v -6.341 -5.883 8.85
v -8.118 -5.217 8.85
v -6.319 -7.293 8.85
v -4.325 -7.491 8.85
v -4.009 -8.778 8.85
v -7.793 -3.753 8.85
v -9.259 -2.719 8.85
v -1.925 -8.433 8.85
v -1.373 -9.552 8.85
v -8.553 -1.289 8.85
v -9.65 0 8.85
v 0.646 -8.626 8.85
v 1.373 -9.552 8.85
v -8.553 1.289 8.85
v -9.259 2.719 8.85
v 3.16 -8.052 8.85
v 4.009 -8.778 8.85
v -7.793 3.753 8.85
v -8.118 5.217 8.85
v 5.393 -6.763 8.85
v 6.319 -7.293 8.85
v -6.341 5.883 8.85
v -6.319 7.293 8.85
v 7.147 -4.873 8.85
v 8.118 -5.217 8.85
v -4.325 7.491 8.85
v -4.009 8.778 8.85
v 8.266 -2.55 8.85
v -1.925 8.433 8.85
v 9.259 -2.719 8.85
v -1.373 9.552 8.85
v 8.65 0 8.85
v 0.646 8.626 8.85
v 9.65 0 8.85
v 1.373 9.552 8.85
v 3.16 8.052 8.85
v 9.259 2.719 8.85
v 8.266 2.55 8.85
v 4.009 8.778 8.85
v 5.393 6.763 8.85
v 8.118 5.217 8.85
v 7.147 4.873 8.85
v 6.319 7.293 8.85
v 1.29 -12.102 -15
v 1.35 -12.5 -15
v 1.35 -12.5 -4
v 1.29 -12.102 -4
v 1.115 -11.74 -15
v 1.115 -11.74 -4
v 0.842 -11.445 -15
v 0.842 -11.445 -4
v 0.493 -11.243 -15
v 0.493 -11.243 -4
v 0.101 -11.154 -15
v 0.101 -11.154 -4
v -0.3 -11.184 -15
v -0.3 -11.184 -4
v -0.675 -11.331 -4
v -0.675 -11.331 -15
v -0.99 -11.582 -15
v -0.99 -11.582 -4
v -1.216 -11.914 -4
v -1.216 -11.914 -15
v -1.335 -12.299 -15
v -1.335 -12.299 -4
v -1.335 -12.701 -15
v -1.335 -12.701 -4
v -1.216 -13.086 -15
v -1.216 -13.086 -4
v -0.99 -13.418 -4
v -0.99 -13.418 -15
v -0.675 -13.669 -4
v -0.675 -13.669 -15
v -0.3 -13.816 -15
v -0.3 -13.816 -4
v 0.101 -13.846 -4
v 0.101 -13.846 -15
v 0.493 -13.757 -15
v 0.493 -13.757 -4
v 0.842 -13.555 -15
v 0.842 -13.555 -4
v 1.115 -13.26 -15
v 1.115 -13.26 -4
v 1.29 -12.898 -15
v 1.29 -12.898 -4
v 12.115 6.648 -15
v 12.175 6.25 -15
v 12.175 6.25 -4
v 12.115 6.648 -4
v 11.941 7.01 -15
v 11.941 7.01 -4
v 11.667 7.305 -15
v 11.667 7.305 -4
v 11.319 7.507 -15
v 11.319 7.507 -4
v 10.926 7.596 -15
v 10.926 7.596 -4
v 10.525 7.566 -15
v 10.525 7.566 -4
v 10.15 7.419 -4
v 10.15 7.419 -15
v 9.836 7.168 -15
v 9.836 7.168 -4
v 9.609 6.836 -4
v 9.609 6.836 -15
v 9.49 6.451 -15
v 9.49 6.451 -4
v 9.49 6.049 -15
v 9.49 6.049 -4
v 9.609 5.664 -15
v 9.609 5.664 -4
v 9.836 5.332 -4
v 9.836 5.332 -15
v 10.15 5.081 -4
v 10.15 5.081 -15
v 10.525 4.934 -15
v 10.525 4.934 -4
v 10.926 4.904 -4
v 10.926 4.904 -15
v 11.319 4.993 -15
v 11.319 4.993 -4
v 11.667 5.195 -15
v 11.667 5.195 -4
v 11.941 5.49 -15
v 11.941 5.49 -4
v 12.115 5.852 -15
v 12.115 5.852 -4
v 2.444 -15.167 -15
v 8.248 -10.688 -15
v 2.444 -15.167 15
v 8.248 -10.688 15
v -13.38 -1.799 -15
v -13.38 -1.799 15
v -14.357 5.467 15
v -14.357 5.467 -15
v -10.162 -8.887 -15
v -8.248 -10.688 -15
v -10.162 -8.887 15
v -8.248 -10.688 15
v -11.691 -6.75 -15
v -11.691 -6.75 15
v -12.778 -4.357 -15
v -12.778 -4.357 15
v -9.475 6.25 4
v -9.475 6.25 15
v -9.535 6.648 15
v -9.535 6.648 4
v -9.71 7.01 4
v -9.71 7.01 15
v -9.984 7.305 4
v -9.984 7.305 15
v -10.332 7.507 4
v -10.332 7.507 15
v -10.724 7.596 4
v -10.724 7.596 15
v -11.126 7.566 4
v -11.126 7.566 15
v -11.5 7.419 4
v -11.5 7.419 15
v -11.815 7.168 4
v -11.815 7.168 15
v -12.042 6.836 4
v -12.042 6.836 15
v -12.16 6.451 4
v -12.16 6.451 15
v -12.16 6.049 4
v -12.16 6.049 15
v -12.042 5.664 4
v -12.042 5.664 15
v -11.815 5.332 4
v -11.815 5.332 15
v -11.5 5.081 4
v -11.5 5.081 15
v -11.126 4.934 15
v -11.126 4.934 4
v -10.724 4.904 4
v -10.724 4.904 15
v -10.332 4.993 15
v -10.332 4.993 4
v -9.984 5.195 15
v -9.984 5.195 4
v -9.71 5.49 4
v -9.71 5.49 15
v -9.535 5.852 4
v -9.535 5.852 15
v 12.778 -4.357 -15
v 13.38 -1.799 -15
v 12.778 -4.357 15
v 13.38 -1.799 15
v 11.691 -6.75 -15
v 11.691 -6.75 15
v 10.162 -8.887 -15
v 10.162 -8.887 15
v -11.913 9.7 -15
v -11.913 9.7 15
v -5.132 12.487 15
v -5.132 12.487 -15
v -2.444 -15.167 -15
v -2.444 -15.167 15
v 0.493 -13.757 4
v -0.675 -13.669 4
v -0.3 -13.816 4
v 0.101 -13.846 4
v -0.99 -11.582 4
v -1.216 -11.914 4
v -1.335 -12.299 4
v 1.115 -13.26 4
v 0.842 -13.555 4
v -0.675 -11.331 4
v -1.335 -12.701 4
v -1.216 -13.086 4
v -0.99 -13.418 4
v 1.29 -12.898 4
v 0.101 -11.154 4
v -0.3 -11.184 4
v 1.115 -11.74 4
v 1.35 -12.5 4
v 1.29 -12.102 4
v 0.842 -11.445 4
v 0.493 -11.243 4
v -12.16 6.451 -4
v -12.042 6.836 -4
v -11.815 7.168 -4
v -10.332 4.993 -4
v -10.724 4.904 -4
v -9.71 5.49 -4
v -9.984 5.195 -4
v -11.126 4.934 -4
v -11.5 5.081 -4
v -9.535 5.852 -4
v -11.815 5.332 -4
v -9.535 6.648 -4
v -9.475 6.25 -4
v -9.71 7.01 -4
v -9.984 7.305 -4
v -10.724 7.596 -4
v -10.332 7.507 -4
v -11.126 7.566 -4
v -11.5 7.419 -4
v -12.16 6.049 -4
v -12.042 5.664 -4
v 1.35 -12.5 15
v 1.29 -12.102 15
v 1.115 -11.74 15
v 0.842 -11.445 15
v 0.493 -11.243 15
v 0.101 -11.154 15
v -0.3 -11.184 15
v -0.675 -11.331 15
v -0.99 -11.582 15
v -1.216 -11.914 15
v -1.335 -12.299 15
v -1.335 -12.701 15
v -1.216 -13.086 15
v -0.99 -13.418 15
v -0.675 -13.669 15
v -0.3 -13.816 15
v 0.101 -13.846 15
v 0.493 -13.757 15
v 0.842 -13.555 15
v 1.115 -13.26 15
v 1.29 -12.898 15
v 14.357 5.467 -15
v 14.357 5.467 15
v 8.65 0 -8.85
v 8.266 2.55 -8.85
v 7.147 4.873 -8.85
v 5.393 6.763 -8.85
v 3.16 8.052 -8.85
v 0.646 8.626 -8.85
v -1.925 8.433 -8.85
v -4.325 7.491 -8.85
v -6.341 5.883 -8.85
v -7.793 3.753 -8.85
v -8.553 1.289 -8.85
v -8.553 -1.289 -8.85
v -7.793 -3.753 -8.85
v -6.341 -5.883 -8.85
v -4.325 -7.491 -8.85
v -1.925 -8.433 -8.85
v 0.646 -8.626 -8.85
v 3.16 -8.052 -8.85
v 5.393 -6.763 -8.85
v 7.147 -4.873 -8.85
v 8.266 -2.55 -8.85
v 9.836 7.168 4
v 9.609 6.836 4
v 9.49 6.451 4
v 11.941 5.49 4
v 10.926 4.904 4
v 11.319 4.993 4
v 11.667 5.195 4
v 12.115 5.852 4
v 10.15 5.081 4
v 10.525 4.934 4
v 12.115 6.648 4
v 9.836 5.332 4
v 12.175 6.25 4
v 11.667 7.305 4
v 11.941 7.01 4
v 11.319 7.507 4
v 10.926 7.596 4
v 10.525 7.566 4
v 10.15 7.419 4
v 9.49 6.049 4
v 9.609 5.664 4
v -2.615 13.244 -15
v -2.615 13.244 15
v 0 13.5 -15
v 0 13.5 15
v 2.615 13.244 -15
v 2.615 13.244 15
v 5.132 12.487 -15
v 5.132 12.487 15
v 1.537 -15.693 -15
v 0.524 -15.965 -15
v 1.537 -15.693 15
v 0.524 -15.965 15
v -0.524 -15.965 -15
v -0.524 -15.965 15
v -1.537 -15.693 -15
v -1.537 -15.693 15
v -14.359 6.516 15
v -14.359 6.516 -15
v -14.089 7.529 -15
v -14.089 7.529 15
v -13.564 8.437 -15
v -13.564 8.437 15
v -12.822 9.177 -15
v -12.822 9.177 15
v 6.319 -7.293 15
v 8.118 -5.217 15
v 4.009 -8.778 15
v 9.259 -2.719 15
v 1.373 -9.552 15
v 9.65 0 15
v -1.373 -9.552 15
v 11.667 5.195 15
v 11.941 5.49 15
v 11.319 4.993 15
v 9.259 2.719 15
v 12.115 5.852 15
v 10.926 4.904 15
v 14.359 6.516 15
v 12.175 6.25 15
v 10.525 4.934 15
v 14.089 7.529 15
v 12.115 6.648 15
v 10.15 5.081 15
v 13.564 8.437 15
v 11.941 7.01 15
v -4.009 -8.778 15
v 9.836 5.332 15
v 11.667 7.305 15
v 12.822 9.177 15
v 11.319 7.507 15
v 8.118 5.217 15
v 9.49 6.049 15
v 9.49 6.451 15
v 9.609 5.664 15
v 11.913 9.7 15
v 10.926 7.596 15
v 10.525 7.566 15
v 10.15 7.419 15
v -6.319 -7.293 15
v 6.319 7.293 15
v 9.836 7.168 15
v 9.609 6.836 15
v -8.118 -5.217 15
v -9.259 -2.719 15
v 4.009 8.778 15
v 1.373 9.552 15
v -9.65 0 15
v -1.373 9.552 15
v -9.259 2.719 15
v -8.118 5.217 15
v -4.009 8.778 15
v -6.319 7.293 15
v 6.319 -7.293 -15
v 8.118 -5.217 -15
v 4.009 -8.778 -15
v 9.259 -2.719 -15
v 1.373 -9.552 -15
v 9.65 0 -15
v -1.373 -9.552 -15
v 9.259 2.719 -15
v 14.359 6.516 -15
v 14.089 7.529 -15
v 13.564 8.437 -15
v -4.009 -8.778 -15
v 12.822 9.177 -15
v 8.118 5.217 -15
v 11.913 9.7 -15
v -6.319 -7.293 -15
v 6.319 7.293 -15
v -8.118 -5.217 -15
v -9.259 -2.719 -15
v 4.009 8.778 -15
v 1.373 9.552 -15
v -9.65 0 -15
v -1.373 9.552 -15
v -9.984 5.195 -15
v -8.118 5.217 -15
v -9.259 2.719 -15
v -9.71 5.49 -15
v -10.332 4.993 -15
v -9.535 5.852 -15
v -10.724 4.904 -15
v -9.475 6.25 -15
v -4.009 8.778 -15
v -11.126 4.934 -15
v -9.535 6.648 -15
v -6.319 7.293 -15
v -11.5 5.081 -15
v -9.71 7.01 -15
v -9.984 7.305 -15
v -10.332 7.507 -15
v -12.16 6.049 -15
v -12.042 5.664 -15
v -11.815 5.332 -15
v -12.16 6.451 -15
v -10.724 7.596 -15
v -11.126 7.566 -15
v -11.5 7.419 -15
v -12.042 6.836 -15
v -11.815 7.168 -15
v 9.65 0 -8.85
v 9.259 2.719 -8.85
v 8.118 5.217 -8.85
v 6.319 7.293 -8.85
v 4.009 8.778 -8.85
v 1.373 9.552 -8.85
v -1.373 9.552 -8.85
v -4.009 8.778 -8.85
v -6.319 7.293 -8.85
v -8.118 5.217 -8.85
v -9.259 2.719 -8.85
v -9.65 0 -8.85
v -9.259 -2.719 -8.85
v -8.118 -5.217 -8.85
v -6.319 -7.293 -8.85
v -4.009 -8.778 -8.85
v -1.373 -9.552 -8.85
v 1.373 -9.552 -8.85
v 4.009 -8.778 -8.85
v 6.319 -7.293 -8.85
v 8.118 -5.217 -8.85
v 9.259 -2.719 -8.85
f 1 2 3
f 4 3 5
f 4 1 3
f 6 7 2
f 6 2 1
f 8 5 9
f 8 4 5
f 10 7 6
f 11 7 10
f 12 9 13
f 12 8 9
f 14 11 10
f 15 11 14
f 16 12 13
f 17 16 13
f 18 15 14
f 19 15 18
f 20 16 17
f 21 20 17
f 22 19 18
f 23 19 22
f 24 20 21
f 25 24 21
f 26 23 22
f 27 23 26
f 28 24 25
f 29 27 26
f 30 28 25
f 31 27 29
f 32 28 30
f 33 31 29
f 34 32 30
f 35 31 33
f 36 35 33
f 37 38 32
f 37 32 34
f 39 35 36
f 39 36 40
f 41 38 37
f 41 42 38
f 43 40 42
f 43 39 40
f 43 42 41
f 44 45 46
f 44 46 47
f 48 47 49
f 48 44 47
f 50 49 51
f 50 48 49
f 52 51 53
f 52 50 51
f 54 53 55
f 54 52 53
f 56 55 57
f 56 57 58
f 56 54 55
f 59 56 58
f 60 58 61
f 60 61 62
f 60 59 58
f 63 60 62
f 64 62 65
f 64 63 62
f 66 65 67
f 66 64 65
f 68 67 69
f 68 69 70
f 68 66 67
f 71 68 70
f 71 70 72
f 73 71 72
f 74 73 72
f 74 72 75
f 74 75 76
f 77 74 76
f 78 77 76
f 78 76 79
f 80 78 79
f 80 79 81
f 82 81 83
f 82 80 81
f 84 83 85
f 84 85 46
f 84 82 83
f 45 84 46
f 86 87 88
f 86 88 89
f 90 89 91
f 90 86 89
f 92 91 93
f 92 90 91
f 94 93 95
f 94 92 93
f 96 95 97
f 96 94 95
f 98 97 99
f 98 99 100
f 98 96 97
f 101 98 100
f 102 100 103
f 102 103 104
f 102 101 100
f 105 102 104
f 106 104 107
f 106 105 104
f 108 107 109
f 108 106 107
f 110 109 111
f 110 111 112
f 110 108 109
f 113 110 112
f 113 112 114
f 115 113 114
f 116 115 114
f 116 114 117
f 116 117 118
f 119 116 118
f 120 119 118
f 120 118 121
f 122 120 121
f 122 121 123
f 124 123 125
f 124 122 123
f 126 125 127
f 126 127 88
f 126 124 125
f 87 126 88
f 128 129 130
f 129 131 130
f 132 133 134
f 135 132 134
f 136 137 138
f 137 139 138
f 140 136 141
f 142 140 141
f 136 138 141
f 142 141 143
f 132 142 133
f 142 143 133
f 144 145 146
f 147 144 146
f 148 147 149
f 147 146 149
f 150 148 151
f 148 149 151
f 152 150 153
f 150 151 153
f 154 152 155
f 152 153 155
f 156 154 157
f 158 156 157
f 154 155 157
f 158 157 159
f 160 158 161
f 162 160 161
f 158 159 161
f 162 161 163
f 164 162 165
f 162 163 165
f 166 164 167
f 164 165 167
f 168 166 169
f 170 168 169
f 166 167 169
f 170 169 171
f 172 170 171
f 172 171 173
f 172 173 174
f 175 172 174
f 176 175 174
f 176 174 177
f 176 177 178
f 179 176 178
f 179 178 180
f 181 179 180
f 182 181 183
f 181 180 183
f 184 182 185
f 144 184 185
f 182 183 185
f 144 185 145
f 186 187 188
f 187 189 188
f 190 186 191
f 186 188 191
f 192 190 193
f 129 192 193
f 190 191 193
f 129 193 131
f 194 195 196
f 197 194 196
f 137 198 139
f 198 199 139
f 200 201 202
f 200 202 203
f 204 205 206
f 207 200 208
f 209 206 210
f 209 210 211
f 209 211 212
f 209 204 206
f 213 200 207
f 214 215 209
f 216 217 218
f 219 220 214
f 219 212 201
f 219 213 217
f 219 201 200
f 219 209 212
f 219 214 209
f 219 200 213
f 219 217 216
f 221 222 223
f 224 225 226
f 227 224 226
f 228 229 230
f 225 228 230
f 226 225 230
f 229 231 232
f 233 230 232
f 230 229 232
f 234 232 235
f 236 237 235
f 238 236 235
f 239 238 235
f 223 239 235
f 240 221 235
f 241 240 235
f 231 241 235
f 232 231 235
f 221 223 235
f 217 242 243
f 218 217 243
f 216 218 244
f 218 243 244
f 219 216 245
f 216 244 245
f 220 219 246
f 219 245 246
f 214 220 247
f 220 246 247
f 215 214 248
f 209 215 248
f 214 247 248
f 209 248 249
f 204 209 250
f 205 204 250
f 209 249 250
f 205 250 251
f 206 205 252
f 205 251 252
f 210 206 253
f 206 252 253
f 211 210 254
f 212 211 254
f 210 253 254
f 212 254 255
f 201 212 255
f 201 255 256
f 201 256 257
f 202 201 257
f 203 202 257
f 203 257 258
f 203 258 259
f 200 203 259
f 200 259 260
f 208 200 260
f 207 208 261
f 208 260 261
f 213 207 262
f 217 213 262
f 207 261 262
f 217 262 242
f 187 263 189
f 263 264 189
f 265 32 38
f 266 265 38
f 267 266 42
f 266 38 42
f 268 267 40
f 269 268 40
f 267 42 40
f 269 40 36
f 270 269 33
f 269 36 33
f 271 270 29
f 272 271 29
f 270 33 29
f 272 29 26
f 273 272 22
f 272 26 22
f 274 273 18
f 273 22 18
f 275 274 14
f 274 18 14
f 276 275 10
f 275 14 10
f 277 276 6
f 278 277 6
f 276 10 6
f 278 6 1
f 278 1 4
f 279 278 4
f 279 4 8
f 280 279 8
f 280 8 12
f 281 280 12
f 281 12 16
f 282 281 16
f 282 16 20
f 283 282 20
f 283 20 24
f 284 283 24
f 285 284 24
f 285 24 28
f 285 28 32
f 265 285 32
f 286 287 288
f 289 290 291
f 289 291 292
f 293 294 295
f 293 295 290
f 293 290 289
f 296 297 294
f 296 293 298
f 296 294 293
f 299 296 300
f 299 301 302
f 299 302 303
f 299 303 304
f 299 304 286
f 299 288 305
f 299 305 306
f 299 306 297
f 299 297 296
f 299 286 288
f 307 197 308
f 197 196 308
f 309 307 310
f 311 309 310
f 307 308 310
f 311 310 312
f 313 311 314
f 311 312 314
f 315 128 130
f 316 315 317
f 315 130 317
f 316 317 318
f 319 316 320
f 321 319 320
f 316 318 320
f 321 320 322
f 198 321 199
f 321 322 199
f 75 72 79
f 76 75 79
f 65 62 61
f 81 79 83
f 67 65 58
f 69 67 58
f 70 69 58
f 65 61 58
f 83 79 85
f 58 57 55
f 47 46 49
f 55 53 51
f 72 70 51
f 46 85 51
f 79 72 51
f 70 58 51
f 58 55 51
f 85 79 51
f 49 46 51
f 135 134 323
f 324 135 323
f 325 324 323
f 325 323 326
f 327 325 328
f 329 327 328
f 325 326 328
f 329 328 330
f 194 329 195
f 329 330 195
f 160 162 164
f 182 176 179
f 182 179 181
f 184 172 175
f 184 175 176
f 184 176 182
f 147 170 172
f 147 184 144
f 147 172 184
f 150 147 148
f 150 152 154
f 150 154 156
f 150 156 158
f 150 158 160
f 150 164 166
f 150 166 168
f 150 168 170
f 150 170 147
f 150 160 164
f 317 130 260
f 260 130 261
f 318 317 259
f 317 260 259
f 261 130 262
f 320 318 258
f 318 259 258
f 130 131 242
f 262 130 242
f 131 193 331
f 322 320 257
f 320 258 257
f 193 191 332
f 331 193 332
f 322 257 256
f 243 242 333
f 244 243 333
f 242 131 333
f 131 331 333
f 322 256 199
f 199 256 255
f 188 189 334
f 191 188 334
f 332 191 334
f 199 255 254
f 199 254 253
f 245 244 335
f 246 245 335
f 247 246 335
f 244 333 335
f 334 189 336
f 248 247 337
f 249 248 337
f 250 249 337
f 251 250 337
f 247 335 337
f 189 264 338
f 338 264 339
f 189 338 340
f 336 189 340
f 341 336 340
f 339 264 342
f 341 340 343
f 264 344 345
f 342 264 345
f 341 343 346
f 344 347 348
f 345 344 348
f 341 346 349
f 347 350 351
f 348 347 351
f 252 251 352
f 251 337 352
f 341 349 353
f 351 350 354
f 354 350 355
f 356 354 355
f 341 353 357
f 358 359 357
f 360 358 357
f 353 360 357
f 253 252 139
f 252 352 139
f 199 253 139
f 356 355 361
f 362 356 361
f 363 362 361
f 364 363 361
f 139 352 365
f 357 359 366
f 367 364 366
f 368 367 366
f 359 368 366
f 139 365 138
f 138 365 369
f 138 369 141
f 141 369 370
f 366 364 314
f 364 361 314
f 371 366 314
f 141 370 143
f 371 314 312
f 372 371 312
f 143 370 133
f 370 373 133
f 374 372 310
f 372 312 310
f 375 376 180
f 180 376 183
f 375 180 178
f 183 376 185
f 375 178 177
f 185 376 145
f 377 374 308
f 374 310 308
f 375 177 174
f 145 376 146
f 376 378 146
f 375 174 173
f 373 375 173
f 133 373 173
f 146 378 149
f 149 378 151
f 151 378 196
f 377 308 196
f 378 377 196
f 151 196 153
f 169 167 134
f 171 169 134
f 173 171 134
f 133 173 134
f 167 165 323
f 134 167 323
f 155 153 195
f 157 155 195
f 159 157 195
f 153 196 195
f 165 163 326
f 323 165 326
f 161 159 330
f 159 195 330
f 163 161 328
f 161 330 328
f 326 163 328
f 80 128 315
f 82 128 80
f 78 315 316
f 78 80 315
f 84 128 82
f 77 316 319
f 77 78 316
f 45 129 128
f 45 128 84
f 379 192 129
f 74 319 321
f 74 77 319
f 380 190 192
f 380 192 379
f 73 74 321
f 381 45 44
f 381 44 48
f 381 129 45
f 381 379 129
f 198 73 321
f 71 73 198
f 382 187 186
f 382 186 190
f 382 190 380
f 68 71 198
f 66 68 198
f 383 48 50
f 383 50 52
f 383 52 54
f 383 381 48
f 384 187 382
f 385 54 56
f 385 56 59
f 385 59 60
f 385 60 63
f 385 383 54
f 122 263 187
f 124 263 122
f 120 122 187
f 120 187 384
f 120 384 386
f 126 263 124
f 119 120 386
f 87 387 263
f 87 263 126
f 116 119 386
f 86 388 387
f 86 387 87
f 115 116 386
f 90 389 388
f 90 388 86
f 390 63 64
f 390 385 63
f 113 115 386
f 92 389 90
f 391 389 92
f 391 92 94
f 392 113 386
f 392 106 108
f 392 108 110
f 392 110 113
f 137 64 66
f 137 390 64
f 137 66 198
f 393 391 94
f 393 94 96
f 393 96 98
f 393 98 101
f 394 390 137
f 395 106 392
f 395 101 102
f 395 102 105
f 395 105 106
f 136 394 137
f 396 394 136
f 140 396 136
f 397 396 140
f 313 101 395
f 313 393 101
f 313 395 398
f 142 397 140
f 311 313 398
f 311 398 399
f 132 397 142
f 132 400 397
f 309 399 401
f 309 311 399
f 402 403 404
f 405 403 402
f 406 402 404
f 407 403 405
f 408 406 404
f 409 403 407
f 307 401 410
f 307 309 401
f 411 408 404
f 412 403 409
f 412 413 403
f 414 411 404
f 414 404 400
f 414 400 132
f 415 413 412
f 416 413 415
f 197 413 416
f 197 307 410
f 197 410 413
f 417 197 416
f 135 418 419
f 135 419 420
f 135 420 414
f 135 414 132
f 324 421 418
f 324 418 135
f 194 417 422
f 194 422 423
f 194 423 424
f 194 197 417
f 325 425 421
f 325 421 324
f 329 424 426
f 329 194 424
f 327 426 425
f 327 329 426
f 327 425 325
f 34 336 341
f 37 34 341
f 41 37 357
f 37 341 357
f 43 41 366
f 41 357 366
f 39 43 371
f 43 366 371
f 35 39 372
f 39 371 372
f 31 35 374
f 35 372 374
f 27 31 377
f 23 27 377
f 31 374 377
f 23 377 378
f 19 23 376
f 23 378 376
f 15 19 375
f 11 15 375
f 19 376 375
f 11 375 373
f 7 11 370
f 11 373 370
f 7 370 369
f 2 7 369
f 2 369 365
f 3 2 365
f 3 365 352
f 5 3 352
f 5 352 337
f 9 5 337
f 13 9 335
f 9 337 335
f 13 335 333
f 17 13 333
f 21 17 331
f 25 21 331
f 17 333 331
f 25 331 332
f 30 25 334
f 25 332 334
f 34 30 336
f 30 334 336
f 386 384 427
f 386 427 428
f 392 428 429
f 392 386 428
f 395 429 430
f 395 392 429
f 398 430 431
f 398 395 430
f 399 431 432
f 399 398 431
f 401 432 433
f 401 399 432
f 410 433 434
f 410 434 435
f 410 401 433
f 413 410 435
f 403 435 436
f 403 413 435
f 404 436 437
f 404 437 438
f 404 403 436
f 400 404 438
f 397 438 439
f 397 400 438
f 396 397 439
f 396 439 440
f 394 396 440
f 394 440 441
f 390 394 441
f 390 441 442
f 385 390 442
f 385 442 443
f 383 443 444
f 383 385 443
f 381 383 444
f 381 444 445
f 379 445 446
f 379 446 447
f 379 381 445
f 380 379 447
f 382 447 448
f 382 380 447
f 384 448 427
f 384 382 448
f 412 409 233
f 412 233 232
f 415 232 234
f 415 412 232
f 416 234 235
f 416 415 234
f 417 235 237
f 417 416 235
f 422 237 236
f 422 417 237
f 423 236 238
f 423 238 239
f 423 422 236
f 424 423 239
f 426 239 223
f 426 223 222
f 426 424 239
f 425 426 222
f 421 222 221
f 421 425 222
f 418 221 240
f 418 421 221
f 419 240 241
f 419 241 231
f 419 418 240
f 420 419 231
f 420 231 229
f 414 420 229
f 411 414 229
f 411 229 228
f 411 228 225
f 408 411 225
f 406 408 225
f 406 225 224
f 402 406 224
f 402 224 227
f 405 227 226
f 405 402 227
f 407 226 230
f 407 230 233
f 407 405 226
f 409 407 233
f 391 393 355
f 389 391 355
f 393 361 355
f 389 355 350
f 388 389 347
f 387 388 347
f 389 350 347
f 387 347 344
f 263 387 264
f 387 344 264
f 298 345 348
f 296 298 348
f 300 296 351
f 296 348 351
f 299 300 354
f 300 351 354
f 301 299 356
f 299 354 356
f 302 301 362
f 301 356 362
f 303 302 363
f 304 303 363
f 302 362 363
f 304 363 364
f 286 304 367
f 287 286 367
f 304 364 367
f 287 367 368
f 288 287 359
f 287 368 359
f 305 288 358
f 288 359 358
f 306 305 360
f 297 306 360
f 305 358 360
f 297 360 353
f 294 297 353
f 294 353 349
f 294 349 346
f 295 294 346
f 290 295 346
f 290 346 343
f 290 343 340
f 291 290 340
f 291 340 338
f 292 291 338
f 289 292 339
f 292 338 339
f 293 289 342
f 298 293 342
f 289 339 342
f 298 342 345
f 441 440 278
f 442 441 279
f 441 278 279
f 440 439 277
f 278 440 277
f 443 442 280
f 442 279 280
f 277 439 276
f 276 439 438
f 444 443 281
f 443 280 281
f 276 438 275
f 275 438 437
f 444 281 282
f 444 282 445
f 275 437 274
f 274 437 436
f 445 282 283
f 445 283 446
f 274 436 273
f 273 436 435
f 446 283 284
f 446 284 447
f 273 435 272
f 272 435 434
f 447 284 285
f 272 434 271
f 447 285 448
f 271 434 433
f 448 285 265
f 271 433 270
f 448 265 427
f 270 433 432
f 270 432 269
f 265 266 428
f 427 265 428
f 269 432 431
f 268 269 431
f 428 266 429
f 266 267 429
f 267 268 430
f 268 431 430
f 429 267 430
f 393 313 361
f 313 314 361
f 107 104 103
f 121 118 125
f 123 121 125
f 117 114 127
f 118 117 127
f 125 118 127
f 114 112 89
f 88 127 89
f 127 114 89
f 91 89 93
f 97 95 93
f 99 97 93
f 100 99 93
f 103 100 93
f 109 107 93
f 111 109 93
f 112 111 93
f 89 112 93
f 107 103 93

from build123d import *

# Parameters (mm, degrees)
EXTRUDE_769_DEPTH      = 15
SKETCH_2_R             = 9.65
CUT_EXTRUDE_1101_DEPTH = 6.15
SKETCH_3_R             = 8.65
CUT_EXTRUDE_1243_DEPTH = 33.124148841
SKETCH_4_R             = 1.35
CUT_EXTRUDE_1735_DEPTH = 11


with BuildPart() as part:
    # Эскиз1 → Extrude 769 (new, symmetric)
    with BuildSketch(Plane.XY):
        with BuildLine():
            Line((-11.912812099, 9.699737517), (-5.131711981, 12.486614118))
            ThreePointArc((-5.131711981, 12.486614118), (0, 13.5), (5.131711981, 12.486614118))
            Line((5.131711981, 12.486614118), (11.912812099, 9.699737517))
            ThreePointArc((11.912812099, 9.699737517), (13.856406461, 8), (14.356625149, 5.46692915))
            Line((14.356625149, 5.46692915), (13.379581024, -1.799114118))
            ThreePointArc((13.379581024, -1.799114118), (11.691342951, -6.75), (8.247869043, -10.6875))
            Line((8.247869043, -10.6875), (2.44381305, -15.166666667))
            ThreePointArc((2.44381305, -15.166666667), (0, -16), (-2.44381305, -15.166666667))
            Line((-2.44381305, -15.166666667), (-8.247869043, -10.6875))
            ThreePointArc((-8.247869043, -10.6875), (-11.691342951, -6.75), (-13.379581024, -1.799114118))
            Line((-13.379581024, -1.799114118), (-14.356625149, 5.46692915))
            ThreePointArc((-14.356625149, 5.46692915), (-13.856406461, 8), (-11.912812099, 9.699737517))
        make_face()
    extrude(amount=EXTRUDE_769_DEPTH, both=True)

    # Эскиз2 → Cut-Extrude 1101 (cut)
    with BuildSketch(Plane.XY.offset(15)):
        Circle(SKETCH_2_R)
    cut_extrude_1101 = extrude(amount=-CUT_EXTRUDE_1101_DEPTH, mode=Mode.SUBTRACT)

    # Mirror 1143: Cut-Extrude 1101 across plane
    add(cut_extrude_1101.mirror(Plane.XY), mode=Mode.SUBTRACT)

    # Эскиз3 → Cut-Extrude 1243 (cut, through all)
    with BuildSketch(Plane.XY.offset(8.85)):
        Circle(SKETCH_3_R)
    extrude(amount=-CUT_EXTRUDE_1243_DEPTH, mode=Mode.SUBTRACT)

    # Эскиз4 → Cut-Extrude 1735 (cut)
    with BuildSketch(Plane.XY.offset(15)):
        with Locations((-10.825317547, 6.25)):
            Circle(SKETCH_4_R)
        with Locations((0, -12.5)):
            Circle(SKETCH_4_R)
        with Locations((10.825317547, 6.25)):
            Circle(SKETCH_4_R)
    cut_extrude_1735 = extrude(amount=-CUT_EXTRUDE_1735_DEPTH, mode=Mode.SUBTRACT)

    # Mirror 1779: Cut-Extrude 1735 across plane
    add(cut_extrude_1735.mirror(Plane.XY), mode=Mode.SUBTRACT)


solid = part.part
